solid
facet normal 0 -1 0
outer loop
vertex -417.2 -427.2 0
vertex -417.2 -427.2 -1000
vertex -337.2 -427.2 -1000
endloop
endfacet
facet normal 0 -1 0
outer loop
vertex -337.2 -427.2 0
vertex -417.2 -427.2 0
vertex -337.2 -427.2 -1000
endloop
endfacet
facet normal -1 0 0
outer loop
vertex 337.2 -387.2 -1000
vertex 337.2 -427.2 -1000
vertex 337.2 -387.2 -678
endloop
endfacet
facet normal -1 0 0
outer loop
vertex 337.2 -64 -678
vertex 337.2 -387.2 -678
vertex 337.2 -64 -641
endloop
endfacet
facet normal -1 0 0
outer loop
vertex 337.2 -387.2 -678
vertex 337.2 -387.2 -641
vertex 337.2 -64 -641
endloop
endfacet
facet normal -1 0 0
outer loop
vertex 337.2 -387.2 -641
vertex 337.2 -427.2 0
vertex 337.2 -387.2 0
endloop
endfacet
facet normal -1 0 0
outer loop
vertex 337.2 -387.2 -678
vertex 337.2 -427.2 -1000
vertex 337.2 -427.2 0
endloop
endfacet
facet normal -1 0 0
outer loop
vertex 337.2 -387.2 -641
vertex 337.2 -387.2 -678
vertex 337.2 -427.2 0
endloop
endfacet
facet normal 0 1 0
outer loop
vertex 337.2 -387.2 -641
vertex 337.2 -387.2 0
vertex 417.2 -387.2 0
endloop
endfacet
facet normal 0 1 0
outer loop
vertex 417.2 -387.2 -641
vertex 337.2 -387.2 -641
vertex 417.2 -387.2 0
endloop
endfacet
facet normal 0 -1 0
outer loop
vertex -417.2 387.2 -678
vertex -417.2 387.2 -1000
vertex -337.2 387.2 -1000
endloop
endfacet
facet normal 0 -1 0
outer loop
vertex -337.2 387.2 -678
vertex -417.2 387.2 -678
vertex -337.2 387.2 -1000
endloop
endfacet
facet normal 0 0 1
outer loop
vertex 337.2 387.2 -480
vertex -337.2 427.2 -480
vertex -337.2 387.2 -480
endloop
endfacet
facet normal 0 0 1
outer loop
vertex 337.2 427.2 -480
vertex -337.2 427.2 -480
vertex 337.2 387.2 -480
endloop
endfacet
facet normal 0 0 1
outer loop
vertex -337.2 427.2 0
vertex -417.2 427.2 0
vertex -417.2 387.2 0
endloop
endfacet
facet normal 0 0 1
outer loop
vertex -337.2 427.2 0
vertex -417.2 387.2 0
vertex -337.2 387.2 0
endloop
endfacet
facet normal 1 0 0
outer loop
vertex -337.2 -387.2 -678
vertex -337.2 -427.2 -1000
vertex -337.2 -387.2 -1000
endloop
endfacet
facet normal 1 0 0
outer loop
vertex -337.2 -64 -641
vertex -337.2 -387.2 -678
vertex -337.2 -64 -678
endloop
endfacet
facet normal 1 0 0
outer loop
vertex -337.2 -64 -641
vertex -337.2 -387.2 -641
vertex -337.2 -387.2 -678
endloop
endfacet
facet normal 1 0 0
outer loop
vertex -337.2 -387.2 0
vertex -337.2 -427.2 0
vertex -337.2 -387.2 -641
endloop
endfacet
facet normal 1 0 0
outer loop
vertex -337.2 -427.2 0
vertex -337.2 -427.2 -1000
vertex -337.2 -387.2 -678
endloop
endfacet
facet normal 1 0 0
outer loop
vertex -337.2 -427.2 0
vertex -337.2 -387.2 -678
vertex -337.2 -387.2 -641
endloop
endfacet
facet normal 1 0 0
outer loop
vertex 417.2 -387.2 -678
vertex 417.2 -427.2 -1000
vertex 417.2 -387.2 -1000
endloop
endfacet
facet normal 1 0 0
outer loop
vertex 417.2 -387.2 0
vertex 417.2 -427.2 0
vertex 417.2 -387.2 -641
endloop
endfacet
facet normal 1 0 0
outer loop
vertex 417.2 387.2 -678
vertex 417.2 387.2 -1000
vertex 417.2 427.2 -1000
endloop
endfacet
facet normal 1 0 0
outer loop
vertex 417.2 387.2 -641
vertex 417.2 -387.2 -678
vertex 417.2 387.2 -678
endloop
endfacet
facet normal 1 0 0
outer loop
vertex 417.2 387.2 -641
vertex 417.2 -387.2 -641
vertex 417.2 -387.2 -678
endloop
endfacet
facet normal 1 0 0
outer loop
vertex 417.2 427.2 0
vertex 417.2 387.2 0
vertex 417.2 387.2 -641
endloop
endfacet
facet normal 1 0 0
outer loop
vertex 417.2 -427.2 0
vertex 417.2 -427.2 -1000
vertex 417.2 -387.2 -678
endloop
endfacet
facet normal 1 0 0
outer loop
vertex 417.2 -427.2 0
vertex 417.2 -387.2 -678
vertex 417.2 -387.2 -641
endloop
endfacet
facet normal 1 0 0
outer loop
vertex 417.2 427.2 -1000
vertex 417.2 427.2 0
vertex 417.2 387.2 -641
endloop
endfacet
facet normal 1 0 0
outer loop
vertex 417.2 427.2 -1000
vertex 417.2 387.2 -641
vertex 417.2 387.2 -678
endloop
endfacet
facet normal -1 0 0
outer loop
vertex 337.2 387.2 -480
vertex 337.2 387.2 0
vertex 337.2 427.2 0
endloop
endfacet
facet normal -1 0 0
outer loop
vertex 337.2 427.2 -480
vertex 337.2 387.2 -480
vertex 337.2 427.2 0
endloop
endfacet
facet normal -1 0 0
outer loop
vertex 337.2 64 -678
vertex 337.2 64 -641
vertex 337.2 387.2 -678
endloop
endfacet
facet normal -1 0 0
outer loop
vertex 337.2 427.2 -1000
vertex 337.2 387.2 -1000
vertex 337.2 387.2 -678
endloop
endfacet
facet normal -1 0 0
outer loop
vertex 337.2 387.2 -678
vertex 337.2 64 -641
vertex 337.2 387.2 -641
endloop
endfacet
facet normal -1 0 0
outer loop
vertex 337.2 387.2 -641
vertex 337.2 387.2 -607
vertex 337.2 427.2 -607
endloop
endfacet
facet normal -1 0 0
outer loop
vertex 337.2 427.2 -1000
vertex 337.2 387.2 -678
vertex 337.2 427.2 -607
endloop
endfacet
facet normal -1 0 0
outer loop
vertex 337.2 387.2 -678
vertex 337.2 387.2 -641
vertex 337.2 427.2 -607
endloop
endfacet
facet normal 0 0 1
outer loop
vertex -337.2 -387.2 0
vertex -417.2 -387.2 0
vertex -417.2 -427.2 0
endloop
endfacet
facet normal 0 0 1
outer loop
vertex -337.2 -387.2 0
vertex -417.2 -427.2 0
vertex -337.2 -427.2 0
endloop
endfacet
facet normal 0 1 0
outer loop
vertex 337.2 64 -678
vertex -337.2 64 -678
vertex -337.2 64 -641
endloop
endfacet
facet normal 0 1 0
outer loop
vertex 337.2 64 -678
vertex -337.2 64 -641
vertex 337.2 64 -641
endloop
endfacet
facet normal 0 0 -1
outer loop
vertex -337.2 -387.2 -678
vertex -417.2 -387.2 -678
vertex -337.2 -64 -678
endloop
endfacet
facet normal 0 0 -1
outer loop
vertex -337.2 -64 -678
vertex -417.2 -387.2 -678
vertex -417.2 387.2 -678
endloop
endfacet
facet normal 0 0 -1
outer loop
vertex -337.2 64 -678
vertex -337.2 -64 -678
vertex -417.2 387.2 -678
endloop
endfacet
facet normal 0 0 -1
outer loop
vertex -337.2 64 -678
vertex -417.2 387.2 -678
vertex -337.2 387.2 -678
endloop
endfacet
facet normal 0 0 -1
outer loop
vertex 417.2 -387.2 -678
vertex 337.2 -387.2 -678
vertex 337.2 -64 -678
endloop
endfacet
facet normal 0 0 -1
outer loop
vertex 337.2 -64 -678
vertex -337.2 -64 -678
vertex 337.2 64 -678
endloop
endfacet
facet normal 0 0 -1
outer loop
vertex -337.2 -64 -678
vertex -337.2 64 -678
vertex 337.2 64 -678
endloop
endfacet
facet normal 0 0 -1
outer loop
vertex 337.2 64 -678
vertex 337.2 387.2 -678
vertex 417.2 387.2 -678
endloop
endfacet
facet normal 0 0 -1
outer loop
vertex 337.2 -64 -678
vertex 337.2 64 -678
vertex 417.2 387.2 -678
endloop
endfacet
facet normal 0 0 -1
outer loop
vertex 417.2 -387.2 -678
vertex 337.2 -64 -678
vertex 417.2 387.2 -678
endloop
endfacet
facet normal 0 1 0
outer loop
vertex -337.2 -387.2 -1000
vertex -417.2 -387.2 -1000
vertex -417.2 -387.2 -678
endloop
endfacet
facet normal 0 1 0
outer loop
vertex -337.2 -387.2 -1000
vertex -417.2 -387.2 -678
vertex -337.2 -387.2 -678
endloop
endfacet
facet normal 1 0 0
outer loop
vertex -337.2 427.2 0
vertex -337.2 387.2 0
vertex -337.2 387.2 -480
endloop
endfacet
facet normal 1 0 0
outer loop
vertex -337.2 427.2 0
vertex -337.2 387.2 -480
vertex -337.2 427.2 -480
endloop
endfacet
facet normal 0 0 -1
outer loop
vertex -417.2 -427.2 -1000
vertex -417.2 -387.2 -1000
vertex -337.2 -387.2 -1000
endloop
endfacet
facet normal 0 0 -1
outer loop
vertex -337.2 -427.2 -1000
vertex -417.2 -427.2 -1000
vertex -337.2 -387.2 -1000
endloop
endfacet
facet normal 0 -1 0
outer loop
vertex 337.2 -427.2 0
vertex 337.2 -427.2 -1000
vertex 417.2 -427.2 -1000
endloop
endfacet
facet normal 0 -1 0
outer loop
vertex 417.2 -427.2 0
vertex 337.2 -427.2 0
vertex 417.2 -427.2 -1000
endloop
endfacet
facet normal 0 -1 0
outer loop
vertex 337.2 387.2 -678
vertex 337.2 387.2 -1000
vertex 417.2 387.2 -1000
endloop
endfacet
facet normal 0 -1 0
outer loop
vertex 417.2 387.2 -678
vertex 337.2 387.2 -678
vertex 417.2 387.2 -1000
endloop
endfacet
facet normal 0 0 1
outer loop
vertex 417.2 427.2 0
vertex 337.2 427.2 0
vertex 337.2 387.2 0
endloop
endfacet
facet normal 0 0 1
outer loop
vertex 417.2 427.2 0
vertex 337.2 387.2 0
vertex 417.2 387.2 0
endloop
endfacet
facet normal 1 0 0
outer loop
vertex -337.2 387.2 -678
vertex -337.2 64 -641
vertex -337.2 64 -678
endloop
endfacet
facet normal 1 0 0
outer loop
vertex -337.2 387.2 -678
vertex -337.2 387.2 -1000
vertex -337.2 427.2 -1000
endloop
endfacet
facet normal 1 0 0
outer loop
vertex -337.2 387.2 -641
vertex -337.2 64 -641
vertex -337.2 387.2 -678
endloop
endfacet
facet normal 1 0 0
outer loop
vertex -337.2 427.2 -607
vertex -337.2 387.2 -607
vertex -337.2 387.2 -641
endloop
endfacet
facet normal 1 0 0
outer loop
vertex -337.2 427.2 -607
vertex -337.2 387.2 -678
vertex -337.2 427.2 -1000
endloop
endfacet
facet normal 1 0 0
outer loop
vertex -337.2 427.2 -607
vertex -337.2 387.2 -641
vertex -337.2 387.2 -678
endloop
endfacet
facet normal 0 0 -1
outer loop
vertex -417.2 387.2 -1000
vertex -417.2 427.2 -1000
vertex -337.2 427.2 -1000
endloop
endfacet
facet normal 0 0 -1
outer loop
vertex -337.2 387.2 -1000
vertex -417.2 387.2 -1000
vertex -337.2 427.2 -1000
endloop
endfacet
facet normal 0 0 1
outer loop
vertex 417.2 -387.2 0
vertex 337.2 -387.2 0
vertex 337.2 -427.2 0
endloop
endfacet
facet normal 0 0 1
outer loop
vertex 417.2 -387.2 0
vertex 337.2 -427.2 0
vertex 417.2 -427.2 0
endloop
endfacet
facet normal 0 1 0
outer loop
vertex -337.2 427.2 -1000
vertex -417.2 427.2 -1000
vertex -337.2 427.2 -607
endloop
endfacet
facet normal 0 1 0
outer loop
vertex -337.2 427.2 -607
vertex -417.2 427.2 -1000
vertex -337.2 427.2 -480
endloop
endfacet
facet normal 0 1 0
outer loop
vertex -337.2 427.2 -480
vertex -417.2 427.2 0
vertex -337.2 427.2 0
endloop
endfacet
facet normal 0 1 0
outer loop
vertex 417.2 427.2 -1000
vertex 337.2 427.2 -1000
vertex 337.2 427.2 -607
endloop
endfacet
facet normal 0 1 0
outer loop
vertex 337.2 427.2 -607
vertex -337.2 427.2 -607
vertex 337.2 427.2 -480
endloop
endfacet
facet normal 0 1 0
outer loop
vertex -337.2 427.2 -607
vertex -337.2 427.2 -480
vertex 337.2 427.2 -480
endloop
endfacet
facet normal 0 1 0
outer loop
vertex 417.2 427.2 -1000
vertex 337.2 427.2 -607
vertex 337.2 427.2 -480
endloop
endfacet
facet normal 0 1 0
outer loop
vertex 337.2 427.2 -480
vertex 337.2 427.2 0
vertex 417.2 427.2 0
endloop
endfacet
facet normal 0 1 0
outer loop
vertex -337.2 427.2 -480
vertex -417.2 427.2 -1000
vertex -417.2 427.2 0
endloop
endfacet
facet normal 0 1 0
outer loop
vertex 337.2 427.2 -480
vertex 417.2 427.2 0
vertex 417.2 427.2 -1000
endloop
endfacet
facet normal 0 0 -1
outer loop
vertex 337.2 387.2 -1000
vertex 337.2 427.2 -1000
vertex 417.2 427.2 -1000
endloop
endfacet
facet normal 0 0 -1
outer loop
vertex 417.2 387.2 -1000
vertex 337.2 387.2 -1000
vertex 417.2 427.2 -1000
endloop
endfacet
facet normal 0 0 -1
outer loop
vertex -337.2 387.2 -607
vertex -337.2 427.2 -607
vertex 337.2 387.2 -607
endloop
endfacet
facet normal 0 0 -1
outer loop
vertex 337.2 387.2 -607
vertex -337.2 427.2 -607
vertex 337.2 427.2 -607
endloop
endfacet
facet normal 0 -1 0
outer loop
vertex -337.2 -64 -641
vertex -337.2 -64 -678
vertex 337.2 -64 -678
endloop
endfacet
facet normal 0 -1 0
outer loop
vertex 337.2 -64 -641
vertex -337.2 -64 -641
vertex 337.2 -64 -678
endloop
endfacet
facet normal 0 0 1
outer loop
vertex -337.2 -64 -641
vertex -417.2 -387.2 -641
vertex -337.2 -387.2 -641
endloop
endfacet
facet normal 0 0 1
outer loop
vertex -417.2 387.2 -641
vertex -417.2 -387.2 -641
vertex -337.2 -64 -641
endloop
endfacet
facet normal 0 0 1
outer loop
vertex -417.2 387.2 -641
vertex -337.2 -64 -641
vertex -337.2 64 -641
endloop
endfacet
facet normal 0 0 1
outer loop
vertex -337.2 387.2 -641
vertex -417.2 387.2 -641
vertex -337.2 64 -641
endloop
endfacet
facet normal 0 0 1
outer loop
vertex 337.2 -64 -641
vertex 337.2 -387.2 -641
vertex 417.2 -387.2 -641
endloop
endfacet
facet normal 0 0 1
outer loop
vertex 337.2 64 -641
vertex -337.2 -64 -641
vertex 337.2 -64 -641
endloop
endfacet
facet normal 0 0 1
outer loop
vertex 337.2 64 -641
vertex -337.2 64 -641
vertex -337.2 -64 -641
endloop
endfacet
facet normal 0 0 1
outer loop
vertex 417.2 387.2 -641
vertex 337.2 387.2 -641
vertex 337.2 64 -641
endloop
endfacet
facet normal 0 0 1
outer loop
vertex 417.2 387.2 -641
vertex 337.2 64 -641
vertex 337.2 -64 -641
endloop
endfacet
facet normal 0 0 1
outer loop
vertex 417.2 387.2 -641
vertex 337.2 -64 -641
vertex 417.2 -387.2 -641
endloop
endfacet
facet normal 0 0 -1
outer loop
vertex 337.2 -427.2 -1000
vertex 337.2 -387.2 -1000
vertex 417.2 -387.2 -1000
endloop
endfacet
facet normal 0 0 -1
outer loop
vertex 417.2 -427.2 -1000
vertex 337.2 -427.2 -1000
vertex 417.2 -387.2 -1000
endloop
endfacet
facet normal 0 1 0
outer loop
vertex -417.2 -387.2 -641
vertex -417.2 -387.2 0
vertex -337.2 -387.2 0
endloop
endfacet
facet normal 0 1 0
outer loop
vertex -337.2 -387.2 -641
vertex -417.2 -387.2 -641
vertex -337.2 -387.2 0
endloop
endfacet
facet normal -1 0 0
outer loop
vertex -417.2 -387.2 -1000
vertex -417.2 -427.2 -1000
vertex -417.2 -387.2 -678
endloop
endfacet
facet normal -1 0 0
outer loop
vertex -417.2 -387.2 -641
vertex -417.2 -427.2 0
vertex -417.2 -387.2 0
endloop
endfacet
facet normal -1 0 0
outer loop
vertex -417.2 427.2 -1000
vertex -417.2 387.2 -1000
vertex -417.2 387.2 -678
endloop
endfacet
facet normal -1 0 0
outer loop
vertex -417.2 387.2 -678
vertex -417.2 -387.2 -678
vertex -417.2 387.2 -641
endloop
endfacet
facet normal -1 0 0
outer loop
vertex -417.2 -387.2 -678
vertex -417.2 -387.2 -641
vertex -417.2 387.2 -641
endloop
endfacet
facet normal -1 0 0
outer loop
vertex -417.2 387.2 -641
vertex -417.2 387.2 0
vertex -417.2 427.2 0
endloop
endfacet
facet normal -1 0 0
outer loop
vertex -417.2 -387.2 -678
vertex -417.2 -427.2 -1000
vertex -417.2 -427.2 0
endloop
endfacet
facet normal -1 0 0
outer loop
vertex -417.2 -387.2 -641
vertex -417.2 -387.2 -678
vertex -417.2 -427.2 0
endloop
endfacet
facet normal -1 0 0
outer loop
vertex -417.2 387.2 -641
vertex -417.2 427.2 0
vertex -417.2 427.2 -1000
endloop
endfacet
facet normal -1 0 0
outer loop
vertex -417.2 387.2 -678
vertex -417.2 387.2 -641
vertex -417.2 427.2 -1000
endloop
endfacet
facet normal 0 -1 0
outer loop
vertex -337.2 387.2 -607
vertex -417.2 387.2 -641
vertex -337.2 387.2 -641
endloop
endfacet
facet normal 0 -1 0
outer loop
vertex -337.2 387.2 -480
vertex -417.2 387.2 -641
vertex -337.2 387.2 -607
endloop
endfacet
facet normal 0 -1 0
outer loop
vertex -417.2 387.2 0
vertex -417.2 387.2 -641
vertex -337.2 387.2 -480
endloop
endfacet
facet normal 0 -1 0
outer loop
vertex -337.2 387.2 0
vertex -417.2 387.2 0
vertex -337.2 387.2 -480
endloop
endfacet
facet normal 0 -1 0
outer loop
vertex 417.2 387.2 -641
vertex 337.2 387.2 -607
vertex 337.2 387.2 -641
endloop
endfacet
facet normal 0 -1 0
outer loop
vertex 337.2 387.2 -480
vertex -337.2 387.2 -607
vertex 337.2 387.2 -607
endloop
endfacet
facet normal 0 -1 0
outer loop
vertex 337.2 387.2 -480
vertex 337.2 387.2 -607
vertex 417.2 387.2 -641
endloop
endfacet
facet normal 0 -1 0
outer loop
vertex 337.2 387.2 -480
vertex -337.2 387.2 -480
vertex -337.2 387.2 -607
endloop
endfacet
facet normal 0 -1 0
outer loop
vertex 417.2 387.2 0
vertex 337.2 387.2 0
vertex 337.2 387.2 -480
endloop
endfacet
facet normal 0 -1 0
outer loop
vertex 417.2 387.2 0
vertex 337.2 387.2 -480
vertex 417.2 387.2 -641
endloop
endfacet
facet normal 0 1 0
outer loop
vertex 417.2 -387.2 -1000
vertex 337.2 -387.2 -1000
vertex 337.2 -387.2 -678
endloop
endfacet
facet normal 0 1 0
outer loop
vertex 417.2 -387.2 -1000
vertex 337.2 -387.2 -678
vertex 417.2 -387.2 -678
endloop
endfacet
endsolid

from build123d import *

# Parameters (mm, degrees)
F0_W     = 914.4
F0_H     = 914.4
F0_W_2   = 80
F0_H_2   = 40
F1_DEPTH = 40
F2_DEPTH = 1000
F4_W     = 674.4
F4_H     = 40
F5_DEPTH = 127
F7_W     = 674.4
F7_H     = 128
F8_DEPTH = 37
F9_DEPTH = 40


# Not quite as in the source:
# - a feature names something its author has since deleted; it is built from what else it names


with BuildPart() as f1:
    # F0 (on Top) → F1 (new body)
    with BuildSketch(Plane.XY):
        Rectangle(F0_W, F0_H)
        with Locations((-377.2, -407.2)):
            Rectangle(F0_W_2, F0_H_2, mode=Mode.SUBTRACT)
        with Locations((377.2, -407.2)):
            Rectangle(F0_W_2, F0_H_2, mode=Mode.SUBTRACT)
        with Locations((-377.2, 407.2)):
            Rectangle(F0_W_2, F0_H_2, mode=Mode.SUBTRACT)
        with Locations((377.2, 407.2)):
            Rectangle(F0_W_2, F0_H_2, mode=Mode.SUBTRACT)
        with Locations((-377.2, -407.2)):
            Rectangle(F0_W_2, F0_H_2)
        with Locations((377.2, 407.2)):
            Rectangle(F0_W_2, F0_H_2)
        with Locations((377.2, -407.2)):
            Rectangle(F0_W_2, F0_H_2)
        with Locations((-377.2, 407.2)):
            Rectangle(F0_W_2, F0_H_2)
    extrude(amount=F1_DEPTH)

    # F0 (on Top) → F2 (join)
    with BuildSketch(Plane.XY):
        with Locations((-377.2, -407.2)):
            Rectangle(F0_W_2, F0_H_2)
        with Locations((-377.2, 407.2)):
            Rectangle(F0_W_2, F0_H_2)
        with Locations((377.2, -407.2)):
            Rectangle(F0_W_2, F0_H_2)
        with Locations((377.2, 407.2)):
            Rectangle(F0_W_2, F0_H_2)
    extrude(amount=-F2_DEPTH)

    # F4 (on offset) → F5 (join)
    with BuildSketch(Plane.XY.offset(-607)):
        with Locations((0, 407.2)):
            Rectangle(F4_W, F4_H)
    extrude(amount=F5_DEPTH)

    # F7 (on offset) → F8 (join)
    with BuildSketch(Plane.XY.offset(-678)):
        Polygon((-417.2, 387.2), (-417.2, -387.2), (-337.2, -387.2), (-337.2, -64), (-337.2, 64), (-337.2, 387.2), align=None)
        Polygon((337.2, 64), (337.2, -64), (337.2, -387.2), (417.2, -387.2), (417.2, 387.2), (337.2, 387.2), align=None)
        Rectangle(F7_W, F7_H)
    extrude(amount=F8_DEPTH)

    # F9 (cut): a face of the model
    f9_faces = [f1.faces().sort_by_distance(p)[0] for p in [
        (0, 0, 40),
    ]]
    extrude(f9_faces, amount=-F9_DEPTH, mode=Mode.SUBTRACT)


solid = f1.part
